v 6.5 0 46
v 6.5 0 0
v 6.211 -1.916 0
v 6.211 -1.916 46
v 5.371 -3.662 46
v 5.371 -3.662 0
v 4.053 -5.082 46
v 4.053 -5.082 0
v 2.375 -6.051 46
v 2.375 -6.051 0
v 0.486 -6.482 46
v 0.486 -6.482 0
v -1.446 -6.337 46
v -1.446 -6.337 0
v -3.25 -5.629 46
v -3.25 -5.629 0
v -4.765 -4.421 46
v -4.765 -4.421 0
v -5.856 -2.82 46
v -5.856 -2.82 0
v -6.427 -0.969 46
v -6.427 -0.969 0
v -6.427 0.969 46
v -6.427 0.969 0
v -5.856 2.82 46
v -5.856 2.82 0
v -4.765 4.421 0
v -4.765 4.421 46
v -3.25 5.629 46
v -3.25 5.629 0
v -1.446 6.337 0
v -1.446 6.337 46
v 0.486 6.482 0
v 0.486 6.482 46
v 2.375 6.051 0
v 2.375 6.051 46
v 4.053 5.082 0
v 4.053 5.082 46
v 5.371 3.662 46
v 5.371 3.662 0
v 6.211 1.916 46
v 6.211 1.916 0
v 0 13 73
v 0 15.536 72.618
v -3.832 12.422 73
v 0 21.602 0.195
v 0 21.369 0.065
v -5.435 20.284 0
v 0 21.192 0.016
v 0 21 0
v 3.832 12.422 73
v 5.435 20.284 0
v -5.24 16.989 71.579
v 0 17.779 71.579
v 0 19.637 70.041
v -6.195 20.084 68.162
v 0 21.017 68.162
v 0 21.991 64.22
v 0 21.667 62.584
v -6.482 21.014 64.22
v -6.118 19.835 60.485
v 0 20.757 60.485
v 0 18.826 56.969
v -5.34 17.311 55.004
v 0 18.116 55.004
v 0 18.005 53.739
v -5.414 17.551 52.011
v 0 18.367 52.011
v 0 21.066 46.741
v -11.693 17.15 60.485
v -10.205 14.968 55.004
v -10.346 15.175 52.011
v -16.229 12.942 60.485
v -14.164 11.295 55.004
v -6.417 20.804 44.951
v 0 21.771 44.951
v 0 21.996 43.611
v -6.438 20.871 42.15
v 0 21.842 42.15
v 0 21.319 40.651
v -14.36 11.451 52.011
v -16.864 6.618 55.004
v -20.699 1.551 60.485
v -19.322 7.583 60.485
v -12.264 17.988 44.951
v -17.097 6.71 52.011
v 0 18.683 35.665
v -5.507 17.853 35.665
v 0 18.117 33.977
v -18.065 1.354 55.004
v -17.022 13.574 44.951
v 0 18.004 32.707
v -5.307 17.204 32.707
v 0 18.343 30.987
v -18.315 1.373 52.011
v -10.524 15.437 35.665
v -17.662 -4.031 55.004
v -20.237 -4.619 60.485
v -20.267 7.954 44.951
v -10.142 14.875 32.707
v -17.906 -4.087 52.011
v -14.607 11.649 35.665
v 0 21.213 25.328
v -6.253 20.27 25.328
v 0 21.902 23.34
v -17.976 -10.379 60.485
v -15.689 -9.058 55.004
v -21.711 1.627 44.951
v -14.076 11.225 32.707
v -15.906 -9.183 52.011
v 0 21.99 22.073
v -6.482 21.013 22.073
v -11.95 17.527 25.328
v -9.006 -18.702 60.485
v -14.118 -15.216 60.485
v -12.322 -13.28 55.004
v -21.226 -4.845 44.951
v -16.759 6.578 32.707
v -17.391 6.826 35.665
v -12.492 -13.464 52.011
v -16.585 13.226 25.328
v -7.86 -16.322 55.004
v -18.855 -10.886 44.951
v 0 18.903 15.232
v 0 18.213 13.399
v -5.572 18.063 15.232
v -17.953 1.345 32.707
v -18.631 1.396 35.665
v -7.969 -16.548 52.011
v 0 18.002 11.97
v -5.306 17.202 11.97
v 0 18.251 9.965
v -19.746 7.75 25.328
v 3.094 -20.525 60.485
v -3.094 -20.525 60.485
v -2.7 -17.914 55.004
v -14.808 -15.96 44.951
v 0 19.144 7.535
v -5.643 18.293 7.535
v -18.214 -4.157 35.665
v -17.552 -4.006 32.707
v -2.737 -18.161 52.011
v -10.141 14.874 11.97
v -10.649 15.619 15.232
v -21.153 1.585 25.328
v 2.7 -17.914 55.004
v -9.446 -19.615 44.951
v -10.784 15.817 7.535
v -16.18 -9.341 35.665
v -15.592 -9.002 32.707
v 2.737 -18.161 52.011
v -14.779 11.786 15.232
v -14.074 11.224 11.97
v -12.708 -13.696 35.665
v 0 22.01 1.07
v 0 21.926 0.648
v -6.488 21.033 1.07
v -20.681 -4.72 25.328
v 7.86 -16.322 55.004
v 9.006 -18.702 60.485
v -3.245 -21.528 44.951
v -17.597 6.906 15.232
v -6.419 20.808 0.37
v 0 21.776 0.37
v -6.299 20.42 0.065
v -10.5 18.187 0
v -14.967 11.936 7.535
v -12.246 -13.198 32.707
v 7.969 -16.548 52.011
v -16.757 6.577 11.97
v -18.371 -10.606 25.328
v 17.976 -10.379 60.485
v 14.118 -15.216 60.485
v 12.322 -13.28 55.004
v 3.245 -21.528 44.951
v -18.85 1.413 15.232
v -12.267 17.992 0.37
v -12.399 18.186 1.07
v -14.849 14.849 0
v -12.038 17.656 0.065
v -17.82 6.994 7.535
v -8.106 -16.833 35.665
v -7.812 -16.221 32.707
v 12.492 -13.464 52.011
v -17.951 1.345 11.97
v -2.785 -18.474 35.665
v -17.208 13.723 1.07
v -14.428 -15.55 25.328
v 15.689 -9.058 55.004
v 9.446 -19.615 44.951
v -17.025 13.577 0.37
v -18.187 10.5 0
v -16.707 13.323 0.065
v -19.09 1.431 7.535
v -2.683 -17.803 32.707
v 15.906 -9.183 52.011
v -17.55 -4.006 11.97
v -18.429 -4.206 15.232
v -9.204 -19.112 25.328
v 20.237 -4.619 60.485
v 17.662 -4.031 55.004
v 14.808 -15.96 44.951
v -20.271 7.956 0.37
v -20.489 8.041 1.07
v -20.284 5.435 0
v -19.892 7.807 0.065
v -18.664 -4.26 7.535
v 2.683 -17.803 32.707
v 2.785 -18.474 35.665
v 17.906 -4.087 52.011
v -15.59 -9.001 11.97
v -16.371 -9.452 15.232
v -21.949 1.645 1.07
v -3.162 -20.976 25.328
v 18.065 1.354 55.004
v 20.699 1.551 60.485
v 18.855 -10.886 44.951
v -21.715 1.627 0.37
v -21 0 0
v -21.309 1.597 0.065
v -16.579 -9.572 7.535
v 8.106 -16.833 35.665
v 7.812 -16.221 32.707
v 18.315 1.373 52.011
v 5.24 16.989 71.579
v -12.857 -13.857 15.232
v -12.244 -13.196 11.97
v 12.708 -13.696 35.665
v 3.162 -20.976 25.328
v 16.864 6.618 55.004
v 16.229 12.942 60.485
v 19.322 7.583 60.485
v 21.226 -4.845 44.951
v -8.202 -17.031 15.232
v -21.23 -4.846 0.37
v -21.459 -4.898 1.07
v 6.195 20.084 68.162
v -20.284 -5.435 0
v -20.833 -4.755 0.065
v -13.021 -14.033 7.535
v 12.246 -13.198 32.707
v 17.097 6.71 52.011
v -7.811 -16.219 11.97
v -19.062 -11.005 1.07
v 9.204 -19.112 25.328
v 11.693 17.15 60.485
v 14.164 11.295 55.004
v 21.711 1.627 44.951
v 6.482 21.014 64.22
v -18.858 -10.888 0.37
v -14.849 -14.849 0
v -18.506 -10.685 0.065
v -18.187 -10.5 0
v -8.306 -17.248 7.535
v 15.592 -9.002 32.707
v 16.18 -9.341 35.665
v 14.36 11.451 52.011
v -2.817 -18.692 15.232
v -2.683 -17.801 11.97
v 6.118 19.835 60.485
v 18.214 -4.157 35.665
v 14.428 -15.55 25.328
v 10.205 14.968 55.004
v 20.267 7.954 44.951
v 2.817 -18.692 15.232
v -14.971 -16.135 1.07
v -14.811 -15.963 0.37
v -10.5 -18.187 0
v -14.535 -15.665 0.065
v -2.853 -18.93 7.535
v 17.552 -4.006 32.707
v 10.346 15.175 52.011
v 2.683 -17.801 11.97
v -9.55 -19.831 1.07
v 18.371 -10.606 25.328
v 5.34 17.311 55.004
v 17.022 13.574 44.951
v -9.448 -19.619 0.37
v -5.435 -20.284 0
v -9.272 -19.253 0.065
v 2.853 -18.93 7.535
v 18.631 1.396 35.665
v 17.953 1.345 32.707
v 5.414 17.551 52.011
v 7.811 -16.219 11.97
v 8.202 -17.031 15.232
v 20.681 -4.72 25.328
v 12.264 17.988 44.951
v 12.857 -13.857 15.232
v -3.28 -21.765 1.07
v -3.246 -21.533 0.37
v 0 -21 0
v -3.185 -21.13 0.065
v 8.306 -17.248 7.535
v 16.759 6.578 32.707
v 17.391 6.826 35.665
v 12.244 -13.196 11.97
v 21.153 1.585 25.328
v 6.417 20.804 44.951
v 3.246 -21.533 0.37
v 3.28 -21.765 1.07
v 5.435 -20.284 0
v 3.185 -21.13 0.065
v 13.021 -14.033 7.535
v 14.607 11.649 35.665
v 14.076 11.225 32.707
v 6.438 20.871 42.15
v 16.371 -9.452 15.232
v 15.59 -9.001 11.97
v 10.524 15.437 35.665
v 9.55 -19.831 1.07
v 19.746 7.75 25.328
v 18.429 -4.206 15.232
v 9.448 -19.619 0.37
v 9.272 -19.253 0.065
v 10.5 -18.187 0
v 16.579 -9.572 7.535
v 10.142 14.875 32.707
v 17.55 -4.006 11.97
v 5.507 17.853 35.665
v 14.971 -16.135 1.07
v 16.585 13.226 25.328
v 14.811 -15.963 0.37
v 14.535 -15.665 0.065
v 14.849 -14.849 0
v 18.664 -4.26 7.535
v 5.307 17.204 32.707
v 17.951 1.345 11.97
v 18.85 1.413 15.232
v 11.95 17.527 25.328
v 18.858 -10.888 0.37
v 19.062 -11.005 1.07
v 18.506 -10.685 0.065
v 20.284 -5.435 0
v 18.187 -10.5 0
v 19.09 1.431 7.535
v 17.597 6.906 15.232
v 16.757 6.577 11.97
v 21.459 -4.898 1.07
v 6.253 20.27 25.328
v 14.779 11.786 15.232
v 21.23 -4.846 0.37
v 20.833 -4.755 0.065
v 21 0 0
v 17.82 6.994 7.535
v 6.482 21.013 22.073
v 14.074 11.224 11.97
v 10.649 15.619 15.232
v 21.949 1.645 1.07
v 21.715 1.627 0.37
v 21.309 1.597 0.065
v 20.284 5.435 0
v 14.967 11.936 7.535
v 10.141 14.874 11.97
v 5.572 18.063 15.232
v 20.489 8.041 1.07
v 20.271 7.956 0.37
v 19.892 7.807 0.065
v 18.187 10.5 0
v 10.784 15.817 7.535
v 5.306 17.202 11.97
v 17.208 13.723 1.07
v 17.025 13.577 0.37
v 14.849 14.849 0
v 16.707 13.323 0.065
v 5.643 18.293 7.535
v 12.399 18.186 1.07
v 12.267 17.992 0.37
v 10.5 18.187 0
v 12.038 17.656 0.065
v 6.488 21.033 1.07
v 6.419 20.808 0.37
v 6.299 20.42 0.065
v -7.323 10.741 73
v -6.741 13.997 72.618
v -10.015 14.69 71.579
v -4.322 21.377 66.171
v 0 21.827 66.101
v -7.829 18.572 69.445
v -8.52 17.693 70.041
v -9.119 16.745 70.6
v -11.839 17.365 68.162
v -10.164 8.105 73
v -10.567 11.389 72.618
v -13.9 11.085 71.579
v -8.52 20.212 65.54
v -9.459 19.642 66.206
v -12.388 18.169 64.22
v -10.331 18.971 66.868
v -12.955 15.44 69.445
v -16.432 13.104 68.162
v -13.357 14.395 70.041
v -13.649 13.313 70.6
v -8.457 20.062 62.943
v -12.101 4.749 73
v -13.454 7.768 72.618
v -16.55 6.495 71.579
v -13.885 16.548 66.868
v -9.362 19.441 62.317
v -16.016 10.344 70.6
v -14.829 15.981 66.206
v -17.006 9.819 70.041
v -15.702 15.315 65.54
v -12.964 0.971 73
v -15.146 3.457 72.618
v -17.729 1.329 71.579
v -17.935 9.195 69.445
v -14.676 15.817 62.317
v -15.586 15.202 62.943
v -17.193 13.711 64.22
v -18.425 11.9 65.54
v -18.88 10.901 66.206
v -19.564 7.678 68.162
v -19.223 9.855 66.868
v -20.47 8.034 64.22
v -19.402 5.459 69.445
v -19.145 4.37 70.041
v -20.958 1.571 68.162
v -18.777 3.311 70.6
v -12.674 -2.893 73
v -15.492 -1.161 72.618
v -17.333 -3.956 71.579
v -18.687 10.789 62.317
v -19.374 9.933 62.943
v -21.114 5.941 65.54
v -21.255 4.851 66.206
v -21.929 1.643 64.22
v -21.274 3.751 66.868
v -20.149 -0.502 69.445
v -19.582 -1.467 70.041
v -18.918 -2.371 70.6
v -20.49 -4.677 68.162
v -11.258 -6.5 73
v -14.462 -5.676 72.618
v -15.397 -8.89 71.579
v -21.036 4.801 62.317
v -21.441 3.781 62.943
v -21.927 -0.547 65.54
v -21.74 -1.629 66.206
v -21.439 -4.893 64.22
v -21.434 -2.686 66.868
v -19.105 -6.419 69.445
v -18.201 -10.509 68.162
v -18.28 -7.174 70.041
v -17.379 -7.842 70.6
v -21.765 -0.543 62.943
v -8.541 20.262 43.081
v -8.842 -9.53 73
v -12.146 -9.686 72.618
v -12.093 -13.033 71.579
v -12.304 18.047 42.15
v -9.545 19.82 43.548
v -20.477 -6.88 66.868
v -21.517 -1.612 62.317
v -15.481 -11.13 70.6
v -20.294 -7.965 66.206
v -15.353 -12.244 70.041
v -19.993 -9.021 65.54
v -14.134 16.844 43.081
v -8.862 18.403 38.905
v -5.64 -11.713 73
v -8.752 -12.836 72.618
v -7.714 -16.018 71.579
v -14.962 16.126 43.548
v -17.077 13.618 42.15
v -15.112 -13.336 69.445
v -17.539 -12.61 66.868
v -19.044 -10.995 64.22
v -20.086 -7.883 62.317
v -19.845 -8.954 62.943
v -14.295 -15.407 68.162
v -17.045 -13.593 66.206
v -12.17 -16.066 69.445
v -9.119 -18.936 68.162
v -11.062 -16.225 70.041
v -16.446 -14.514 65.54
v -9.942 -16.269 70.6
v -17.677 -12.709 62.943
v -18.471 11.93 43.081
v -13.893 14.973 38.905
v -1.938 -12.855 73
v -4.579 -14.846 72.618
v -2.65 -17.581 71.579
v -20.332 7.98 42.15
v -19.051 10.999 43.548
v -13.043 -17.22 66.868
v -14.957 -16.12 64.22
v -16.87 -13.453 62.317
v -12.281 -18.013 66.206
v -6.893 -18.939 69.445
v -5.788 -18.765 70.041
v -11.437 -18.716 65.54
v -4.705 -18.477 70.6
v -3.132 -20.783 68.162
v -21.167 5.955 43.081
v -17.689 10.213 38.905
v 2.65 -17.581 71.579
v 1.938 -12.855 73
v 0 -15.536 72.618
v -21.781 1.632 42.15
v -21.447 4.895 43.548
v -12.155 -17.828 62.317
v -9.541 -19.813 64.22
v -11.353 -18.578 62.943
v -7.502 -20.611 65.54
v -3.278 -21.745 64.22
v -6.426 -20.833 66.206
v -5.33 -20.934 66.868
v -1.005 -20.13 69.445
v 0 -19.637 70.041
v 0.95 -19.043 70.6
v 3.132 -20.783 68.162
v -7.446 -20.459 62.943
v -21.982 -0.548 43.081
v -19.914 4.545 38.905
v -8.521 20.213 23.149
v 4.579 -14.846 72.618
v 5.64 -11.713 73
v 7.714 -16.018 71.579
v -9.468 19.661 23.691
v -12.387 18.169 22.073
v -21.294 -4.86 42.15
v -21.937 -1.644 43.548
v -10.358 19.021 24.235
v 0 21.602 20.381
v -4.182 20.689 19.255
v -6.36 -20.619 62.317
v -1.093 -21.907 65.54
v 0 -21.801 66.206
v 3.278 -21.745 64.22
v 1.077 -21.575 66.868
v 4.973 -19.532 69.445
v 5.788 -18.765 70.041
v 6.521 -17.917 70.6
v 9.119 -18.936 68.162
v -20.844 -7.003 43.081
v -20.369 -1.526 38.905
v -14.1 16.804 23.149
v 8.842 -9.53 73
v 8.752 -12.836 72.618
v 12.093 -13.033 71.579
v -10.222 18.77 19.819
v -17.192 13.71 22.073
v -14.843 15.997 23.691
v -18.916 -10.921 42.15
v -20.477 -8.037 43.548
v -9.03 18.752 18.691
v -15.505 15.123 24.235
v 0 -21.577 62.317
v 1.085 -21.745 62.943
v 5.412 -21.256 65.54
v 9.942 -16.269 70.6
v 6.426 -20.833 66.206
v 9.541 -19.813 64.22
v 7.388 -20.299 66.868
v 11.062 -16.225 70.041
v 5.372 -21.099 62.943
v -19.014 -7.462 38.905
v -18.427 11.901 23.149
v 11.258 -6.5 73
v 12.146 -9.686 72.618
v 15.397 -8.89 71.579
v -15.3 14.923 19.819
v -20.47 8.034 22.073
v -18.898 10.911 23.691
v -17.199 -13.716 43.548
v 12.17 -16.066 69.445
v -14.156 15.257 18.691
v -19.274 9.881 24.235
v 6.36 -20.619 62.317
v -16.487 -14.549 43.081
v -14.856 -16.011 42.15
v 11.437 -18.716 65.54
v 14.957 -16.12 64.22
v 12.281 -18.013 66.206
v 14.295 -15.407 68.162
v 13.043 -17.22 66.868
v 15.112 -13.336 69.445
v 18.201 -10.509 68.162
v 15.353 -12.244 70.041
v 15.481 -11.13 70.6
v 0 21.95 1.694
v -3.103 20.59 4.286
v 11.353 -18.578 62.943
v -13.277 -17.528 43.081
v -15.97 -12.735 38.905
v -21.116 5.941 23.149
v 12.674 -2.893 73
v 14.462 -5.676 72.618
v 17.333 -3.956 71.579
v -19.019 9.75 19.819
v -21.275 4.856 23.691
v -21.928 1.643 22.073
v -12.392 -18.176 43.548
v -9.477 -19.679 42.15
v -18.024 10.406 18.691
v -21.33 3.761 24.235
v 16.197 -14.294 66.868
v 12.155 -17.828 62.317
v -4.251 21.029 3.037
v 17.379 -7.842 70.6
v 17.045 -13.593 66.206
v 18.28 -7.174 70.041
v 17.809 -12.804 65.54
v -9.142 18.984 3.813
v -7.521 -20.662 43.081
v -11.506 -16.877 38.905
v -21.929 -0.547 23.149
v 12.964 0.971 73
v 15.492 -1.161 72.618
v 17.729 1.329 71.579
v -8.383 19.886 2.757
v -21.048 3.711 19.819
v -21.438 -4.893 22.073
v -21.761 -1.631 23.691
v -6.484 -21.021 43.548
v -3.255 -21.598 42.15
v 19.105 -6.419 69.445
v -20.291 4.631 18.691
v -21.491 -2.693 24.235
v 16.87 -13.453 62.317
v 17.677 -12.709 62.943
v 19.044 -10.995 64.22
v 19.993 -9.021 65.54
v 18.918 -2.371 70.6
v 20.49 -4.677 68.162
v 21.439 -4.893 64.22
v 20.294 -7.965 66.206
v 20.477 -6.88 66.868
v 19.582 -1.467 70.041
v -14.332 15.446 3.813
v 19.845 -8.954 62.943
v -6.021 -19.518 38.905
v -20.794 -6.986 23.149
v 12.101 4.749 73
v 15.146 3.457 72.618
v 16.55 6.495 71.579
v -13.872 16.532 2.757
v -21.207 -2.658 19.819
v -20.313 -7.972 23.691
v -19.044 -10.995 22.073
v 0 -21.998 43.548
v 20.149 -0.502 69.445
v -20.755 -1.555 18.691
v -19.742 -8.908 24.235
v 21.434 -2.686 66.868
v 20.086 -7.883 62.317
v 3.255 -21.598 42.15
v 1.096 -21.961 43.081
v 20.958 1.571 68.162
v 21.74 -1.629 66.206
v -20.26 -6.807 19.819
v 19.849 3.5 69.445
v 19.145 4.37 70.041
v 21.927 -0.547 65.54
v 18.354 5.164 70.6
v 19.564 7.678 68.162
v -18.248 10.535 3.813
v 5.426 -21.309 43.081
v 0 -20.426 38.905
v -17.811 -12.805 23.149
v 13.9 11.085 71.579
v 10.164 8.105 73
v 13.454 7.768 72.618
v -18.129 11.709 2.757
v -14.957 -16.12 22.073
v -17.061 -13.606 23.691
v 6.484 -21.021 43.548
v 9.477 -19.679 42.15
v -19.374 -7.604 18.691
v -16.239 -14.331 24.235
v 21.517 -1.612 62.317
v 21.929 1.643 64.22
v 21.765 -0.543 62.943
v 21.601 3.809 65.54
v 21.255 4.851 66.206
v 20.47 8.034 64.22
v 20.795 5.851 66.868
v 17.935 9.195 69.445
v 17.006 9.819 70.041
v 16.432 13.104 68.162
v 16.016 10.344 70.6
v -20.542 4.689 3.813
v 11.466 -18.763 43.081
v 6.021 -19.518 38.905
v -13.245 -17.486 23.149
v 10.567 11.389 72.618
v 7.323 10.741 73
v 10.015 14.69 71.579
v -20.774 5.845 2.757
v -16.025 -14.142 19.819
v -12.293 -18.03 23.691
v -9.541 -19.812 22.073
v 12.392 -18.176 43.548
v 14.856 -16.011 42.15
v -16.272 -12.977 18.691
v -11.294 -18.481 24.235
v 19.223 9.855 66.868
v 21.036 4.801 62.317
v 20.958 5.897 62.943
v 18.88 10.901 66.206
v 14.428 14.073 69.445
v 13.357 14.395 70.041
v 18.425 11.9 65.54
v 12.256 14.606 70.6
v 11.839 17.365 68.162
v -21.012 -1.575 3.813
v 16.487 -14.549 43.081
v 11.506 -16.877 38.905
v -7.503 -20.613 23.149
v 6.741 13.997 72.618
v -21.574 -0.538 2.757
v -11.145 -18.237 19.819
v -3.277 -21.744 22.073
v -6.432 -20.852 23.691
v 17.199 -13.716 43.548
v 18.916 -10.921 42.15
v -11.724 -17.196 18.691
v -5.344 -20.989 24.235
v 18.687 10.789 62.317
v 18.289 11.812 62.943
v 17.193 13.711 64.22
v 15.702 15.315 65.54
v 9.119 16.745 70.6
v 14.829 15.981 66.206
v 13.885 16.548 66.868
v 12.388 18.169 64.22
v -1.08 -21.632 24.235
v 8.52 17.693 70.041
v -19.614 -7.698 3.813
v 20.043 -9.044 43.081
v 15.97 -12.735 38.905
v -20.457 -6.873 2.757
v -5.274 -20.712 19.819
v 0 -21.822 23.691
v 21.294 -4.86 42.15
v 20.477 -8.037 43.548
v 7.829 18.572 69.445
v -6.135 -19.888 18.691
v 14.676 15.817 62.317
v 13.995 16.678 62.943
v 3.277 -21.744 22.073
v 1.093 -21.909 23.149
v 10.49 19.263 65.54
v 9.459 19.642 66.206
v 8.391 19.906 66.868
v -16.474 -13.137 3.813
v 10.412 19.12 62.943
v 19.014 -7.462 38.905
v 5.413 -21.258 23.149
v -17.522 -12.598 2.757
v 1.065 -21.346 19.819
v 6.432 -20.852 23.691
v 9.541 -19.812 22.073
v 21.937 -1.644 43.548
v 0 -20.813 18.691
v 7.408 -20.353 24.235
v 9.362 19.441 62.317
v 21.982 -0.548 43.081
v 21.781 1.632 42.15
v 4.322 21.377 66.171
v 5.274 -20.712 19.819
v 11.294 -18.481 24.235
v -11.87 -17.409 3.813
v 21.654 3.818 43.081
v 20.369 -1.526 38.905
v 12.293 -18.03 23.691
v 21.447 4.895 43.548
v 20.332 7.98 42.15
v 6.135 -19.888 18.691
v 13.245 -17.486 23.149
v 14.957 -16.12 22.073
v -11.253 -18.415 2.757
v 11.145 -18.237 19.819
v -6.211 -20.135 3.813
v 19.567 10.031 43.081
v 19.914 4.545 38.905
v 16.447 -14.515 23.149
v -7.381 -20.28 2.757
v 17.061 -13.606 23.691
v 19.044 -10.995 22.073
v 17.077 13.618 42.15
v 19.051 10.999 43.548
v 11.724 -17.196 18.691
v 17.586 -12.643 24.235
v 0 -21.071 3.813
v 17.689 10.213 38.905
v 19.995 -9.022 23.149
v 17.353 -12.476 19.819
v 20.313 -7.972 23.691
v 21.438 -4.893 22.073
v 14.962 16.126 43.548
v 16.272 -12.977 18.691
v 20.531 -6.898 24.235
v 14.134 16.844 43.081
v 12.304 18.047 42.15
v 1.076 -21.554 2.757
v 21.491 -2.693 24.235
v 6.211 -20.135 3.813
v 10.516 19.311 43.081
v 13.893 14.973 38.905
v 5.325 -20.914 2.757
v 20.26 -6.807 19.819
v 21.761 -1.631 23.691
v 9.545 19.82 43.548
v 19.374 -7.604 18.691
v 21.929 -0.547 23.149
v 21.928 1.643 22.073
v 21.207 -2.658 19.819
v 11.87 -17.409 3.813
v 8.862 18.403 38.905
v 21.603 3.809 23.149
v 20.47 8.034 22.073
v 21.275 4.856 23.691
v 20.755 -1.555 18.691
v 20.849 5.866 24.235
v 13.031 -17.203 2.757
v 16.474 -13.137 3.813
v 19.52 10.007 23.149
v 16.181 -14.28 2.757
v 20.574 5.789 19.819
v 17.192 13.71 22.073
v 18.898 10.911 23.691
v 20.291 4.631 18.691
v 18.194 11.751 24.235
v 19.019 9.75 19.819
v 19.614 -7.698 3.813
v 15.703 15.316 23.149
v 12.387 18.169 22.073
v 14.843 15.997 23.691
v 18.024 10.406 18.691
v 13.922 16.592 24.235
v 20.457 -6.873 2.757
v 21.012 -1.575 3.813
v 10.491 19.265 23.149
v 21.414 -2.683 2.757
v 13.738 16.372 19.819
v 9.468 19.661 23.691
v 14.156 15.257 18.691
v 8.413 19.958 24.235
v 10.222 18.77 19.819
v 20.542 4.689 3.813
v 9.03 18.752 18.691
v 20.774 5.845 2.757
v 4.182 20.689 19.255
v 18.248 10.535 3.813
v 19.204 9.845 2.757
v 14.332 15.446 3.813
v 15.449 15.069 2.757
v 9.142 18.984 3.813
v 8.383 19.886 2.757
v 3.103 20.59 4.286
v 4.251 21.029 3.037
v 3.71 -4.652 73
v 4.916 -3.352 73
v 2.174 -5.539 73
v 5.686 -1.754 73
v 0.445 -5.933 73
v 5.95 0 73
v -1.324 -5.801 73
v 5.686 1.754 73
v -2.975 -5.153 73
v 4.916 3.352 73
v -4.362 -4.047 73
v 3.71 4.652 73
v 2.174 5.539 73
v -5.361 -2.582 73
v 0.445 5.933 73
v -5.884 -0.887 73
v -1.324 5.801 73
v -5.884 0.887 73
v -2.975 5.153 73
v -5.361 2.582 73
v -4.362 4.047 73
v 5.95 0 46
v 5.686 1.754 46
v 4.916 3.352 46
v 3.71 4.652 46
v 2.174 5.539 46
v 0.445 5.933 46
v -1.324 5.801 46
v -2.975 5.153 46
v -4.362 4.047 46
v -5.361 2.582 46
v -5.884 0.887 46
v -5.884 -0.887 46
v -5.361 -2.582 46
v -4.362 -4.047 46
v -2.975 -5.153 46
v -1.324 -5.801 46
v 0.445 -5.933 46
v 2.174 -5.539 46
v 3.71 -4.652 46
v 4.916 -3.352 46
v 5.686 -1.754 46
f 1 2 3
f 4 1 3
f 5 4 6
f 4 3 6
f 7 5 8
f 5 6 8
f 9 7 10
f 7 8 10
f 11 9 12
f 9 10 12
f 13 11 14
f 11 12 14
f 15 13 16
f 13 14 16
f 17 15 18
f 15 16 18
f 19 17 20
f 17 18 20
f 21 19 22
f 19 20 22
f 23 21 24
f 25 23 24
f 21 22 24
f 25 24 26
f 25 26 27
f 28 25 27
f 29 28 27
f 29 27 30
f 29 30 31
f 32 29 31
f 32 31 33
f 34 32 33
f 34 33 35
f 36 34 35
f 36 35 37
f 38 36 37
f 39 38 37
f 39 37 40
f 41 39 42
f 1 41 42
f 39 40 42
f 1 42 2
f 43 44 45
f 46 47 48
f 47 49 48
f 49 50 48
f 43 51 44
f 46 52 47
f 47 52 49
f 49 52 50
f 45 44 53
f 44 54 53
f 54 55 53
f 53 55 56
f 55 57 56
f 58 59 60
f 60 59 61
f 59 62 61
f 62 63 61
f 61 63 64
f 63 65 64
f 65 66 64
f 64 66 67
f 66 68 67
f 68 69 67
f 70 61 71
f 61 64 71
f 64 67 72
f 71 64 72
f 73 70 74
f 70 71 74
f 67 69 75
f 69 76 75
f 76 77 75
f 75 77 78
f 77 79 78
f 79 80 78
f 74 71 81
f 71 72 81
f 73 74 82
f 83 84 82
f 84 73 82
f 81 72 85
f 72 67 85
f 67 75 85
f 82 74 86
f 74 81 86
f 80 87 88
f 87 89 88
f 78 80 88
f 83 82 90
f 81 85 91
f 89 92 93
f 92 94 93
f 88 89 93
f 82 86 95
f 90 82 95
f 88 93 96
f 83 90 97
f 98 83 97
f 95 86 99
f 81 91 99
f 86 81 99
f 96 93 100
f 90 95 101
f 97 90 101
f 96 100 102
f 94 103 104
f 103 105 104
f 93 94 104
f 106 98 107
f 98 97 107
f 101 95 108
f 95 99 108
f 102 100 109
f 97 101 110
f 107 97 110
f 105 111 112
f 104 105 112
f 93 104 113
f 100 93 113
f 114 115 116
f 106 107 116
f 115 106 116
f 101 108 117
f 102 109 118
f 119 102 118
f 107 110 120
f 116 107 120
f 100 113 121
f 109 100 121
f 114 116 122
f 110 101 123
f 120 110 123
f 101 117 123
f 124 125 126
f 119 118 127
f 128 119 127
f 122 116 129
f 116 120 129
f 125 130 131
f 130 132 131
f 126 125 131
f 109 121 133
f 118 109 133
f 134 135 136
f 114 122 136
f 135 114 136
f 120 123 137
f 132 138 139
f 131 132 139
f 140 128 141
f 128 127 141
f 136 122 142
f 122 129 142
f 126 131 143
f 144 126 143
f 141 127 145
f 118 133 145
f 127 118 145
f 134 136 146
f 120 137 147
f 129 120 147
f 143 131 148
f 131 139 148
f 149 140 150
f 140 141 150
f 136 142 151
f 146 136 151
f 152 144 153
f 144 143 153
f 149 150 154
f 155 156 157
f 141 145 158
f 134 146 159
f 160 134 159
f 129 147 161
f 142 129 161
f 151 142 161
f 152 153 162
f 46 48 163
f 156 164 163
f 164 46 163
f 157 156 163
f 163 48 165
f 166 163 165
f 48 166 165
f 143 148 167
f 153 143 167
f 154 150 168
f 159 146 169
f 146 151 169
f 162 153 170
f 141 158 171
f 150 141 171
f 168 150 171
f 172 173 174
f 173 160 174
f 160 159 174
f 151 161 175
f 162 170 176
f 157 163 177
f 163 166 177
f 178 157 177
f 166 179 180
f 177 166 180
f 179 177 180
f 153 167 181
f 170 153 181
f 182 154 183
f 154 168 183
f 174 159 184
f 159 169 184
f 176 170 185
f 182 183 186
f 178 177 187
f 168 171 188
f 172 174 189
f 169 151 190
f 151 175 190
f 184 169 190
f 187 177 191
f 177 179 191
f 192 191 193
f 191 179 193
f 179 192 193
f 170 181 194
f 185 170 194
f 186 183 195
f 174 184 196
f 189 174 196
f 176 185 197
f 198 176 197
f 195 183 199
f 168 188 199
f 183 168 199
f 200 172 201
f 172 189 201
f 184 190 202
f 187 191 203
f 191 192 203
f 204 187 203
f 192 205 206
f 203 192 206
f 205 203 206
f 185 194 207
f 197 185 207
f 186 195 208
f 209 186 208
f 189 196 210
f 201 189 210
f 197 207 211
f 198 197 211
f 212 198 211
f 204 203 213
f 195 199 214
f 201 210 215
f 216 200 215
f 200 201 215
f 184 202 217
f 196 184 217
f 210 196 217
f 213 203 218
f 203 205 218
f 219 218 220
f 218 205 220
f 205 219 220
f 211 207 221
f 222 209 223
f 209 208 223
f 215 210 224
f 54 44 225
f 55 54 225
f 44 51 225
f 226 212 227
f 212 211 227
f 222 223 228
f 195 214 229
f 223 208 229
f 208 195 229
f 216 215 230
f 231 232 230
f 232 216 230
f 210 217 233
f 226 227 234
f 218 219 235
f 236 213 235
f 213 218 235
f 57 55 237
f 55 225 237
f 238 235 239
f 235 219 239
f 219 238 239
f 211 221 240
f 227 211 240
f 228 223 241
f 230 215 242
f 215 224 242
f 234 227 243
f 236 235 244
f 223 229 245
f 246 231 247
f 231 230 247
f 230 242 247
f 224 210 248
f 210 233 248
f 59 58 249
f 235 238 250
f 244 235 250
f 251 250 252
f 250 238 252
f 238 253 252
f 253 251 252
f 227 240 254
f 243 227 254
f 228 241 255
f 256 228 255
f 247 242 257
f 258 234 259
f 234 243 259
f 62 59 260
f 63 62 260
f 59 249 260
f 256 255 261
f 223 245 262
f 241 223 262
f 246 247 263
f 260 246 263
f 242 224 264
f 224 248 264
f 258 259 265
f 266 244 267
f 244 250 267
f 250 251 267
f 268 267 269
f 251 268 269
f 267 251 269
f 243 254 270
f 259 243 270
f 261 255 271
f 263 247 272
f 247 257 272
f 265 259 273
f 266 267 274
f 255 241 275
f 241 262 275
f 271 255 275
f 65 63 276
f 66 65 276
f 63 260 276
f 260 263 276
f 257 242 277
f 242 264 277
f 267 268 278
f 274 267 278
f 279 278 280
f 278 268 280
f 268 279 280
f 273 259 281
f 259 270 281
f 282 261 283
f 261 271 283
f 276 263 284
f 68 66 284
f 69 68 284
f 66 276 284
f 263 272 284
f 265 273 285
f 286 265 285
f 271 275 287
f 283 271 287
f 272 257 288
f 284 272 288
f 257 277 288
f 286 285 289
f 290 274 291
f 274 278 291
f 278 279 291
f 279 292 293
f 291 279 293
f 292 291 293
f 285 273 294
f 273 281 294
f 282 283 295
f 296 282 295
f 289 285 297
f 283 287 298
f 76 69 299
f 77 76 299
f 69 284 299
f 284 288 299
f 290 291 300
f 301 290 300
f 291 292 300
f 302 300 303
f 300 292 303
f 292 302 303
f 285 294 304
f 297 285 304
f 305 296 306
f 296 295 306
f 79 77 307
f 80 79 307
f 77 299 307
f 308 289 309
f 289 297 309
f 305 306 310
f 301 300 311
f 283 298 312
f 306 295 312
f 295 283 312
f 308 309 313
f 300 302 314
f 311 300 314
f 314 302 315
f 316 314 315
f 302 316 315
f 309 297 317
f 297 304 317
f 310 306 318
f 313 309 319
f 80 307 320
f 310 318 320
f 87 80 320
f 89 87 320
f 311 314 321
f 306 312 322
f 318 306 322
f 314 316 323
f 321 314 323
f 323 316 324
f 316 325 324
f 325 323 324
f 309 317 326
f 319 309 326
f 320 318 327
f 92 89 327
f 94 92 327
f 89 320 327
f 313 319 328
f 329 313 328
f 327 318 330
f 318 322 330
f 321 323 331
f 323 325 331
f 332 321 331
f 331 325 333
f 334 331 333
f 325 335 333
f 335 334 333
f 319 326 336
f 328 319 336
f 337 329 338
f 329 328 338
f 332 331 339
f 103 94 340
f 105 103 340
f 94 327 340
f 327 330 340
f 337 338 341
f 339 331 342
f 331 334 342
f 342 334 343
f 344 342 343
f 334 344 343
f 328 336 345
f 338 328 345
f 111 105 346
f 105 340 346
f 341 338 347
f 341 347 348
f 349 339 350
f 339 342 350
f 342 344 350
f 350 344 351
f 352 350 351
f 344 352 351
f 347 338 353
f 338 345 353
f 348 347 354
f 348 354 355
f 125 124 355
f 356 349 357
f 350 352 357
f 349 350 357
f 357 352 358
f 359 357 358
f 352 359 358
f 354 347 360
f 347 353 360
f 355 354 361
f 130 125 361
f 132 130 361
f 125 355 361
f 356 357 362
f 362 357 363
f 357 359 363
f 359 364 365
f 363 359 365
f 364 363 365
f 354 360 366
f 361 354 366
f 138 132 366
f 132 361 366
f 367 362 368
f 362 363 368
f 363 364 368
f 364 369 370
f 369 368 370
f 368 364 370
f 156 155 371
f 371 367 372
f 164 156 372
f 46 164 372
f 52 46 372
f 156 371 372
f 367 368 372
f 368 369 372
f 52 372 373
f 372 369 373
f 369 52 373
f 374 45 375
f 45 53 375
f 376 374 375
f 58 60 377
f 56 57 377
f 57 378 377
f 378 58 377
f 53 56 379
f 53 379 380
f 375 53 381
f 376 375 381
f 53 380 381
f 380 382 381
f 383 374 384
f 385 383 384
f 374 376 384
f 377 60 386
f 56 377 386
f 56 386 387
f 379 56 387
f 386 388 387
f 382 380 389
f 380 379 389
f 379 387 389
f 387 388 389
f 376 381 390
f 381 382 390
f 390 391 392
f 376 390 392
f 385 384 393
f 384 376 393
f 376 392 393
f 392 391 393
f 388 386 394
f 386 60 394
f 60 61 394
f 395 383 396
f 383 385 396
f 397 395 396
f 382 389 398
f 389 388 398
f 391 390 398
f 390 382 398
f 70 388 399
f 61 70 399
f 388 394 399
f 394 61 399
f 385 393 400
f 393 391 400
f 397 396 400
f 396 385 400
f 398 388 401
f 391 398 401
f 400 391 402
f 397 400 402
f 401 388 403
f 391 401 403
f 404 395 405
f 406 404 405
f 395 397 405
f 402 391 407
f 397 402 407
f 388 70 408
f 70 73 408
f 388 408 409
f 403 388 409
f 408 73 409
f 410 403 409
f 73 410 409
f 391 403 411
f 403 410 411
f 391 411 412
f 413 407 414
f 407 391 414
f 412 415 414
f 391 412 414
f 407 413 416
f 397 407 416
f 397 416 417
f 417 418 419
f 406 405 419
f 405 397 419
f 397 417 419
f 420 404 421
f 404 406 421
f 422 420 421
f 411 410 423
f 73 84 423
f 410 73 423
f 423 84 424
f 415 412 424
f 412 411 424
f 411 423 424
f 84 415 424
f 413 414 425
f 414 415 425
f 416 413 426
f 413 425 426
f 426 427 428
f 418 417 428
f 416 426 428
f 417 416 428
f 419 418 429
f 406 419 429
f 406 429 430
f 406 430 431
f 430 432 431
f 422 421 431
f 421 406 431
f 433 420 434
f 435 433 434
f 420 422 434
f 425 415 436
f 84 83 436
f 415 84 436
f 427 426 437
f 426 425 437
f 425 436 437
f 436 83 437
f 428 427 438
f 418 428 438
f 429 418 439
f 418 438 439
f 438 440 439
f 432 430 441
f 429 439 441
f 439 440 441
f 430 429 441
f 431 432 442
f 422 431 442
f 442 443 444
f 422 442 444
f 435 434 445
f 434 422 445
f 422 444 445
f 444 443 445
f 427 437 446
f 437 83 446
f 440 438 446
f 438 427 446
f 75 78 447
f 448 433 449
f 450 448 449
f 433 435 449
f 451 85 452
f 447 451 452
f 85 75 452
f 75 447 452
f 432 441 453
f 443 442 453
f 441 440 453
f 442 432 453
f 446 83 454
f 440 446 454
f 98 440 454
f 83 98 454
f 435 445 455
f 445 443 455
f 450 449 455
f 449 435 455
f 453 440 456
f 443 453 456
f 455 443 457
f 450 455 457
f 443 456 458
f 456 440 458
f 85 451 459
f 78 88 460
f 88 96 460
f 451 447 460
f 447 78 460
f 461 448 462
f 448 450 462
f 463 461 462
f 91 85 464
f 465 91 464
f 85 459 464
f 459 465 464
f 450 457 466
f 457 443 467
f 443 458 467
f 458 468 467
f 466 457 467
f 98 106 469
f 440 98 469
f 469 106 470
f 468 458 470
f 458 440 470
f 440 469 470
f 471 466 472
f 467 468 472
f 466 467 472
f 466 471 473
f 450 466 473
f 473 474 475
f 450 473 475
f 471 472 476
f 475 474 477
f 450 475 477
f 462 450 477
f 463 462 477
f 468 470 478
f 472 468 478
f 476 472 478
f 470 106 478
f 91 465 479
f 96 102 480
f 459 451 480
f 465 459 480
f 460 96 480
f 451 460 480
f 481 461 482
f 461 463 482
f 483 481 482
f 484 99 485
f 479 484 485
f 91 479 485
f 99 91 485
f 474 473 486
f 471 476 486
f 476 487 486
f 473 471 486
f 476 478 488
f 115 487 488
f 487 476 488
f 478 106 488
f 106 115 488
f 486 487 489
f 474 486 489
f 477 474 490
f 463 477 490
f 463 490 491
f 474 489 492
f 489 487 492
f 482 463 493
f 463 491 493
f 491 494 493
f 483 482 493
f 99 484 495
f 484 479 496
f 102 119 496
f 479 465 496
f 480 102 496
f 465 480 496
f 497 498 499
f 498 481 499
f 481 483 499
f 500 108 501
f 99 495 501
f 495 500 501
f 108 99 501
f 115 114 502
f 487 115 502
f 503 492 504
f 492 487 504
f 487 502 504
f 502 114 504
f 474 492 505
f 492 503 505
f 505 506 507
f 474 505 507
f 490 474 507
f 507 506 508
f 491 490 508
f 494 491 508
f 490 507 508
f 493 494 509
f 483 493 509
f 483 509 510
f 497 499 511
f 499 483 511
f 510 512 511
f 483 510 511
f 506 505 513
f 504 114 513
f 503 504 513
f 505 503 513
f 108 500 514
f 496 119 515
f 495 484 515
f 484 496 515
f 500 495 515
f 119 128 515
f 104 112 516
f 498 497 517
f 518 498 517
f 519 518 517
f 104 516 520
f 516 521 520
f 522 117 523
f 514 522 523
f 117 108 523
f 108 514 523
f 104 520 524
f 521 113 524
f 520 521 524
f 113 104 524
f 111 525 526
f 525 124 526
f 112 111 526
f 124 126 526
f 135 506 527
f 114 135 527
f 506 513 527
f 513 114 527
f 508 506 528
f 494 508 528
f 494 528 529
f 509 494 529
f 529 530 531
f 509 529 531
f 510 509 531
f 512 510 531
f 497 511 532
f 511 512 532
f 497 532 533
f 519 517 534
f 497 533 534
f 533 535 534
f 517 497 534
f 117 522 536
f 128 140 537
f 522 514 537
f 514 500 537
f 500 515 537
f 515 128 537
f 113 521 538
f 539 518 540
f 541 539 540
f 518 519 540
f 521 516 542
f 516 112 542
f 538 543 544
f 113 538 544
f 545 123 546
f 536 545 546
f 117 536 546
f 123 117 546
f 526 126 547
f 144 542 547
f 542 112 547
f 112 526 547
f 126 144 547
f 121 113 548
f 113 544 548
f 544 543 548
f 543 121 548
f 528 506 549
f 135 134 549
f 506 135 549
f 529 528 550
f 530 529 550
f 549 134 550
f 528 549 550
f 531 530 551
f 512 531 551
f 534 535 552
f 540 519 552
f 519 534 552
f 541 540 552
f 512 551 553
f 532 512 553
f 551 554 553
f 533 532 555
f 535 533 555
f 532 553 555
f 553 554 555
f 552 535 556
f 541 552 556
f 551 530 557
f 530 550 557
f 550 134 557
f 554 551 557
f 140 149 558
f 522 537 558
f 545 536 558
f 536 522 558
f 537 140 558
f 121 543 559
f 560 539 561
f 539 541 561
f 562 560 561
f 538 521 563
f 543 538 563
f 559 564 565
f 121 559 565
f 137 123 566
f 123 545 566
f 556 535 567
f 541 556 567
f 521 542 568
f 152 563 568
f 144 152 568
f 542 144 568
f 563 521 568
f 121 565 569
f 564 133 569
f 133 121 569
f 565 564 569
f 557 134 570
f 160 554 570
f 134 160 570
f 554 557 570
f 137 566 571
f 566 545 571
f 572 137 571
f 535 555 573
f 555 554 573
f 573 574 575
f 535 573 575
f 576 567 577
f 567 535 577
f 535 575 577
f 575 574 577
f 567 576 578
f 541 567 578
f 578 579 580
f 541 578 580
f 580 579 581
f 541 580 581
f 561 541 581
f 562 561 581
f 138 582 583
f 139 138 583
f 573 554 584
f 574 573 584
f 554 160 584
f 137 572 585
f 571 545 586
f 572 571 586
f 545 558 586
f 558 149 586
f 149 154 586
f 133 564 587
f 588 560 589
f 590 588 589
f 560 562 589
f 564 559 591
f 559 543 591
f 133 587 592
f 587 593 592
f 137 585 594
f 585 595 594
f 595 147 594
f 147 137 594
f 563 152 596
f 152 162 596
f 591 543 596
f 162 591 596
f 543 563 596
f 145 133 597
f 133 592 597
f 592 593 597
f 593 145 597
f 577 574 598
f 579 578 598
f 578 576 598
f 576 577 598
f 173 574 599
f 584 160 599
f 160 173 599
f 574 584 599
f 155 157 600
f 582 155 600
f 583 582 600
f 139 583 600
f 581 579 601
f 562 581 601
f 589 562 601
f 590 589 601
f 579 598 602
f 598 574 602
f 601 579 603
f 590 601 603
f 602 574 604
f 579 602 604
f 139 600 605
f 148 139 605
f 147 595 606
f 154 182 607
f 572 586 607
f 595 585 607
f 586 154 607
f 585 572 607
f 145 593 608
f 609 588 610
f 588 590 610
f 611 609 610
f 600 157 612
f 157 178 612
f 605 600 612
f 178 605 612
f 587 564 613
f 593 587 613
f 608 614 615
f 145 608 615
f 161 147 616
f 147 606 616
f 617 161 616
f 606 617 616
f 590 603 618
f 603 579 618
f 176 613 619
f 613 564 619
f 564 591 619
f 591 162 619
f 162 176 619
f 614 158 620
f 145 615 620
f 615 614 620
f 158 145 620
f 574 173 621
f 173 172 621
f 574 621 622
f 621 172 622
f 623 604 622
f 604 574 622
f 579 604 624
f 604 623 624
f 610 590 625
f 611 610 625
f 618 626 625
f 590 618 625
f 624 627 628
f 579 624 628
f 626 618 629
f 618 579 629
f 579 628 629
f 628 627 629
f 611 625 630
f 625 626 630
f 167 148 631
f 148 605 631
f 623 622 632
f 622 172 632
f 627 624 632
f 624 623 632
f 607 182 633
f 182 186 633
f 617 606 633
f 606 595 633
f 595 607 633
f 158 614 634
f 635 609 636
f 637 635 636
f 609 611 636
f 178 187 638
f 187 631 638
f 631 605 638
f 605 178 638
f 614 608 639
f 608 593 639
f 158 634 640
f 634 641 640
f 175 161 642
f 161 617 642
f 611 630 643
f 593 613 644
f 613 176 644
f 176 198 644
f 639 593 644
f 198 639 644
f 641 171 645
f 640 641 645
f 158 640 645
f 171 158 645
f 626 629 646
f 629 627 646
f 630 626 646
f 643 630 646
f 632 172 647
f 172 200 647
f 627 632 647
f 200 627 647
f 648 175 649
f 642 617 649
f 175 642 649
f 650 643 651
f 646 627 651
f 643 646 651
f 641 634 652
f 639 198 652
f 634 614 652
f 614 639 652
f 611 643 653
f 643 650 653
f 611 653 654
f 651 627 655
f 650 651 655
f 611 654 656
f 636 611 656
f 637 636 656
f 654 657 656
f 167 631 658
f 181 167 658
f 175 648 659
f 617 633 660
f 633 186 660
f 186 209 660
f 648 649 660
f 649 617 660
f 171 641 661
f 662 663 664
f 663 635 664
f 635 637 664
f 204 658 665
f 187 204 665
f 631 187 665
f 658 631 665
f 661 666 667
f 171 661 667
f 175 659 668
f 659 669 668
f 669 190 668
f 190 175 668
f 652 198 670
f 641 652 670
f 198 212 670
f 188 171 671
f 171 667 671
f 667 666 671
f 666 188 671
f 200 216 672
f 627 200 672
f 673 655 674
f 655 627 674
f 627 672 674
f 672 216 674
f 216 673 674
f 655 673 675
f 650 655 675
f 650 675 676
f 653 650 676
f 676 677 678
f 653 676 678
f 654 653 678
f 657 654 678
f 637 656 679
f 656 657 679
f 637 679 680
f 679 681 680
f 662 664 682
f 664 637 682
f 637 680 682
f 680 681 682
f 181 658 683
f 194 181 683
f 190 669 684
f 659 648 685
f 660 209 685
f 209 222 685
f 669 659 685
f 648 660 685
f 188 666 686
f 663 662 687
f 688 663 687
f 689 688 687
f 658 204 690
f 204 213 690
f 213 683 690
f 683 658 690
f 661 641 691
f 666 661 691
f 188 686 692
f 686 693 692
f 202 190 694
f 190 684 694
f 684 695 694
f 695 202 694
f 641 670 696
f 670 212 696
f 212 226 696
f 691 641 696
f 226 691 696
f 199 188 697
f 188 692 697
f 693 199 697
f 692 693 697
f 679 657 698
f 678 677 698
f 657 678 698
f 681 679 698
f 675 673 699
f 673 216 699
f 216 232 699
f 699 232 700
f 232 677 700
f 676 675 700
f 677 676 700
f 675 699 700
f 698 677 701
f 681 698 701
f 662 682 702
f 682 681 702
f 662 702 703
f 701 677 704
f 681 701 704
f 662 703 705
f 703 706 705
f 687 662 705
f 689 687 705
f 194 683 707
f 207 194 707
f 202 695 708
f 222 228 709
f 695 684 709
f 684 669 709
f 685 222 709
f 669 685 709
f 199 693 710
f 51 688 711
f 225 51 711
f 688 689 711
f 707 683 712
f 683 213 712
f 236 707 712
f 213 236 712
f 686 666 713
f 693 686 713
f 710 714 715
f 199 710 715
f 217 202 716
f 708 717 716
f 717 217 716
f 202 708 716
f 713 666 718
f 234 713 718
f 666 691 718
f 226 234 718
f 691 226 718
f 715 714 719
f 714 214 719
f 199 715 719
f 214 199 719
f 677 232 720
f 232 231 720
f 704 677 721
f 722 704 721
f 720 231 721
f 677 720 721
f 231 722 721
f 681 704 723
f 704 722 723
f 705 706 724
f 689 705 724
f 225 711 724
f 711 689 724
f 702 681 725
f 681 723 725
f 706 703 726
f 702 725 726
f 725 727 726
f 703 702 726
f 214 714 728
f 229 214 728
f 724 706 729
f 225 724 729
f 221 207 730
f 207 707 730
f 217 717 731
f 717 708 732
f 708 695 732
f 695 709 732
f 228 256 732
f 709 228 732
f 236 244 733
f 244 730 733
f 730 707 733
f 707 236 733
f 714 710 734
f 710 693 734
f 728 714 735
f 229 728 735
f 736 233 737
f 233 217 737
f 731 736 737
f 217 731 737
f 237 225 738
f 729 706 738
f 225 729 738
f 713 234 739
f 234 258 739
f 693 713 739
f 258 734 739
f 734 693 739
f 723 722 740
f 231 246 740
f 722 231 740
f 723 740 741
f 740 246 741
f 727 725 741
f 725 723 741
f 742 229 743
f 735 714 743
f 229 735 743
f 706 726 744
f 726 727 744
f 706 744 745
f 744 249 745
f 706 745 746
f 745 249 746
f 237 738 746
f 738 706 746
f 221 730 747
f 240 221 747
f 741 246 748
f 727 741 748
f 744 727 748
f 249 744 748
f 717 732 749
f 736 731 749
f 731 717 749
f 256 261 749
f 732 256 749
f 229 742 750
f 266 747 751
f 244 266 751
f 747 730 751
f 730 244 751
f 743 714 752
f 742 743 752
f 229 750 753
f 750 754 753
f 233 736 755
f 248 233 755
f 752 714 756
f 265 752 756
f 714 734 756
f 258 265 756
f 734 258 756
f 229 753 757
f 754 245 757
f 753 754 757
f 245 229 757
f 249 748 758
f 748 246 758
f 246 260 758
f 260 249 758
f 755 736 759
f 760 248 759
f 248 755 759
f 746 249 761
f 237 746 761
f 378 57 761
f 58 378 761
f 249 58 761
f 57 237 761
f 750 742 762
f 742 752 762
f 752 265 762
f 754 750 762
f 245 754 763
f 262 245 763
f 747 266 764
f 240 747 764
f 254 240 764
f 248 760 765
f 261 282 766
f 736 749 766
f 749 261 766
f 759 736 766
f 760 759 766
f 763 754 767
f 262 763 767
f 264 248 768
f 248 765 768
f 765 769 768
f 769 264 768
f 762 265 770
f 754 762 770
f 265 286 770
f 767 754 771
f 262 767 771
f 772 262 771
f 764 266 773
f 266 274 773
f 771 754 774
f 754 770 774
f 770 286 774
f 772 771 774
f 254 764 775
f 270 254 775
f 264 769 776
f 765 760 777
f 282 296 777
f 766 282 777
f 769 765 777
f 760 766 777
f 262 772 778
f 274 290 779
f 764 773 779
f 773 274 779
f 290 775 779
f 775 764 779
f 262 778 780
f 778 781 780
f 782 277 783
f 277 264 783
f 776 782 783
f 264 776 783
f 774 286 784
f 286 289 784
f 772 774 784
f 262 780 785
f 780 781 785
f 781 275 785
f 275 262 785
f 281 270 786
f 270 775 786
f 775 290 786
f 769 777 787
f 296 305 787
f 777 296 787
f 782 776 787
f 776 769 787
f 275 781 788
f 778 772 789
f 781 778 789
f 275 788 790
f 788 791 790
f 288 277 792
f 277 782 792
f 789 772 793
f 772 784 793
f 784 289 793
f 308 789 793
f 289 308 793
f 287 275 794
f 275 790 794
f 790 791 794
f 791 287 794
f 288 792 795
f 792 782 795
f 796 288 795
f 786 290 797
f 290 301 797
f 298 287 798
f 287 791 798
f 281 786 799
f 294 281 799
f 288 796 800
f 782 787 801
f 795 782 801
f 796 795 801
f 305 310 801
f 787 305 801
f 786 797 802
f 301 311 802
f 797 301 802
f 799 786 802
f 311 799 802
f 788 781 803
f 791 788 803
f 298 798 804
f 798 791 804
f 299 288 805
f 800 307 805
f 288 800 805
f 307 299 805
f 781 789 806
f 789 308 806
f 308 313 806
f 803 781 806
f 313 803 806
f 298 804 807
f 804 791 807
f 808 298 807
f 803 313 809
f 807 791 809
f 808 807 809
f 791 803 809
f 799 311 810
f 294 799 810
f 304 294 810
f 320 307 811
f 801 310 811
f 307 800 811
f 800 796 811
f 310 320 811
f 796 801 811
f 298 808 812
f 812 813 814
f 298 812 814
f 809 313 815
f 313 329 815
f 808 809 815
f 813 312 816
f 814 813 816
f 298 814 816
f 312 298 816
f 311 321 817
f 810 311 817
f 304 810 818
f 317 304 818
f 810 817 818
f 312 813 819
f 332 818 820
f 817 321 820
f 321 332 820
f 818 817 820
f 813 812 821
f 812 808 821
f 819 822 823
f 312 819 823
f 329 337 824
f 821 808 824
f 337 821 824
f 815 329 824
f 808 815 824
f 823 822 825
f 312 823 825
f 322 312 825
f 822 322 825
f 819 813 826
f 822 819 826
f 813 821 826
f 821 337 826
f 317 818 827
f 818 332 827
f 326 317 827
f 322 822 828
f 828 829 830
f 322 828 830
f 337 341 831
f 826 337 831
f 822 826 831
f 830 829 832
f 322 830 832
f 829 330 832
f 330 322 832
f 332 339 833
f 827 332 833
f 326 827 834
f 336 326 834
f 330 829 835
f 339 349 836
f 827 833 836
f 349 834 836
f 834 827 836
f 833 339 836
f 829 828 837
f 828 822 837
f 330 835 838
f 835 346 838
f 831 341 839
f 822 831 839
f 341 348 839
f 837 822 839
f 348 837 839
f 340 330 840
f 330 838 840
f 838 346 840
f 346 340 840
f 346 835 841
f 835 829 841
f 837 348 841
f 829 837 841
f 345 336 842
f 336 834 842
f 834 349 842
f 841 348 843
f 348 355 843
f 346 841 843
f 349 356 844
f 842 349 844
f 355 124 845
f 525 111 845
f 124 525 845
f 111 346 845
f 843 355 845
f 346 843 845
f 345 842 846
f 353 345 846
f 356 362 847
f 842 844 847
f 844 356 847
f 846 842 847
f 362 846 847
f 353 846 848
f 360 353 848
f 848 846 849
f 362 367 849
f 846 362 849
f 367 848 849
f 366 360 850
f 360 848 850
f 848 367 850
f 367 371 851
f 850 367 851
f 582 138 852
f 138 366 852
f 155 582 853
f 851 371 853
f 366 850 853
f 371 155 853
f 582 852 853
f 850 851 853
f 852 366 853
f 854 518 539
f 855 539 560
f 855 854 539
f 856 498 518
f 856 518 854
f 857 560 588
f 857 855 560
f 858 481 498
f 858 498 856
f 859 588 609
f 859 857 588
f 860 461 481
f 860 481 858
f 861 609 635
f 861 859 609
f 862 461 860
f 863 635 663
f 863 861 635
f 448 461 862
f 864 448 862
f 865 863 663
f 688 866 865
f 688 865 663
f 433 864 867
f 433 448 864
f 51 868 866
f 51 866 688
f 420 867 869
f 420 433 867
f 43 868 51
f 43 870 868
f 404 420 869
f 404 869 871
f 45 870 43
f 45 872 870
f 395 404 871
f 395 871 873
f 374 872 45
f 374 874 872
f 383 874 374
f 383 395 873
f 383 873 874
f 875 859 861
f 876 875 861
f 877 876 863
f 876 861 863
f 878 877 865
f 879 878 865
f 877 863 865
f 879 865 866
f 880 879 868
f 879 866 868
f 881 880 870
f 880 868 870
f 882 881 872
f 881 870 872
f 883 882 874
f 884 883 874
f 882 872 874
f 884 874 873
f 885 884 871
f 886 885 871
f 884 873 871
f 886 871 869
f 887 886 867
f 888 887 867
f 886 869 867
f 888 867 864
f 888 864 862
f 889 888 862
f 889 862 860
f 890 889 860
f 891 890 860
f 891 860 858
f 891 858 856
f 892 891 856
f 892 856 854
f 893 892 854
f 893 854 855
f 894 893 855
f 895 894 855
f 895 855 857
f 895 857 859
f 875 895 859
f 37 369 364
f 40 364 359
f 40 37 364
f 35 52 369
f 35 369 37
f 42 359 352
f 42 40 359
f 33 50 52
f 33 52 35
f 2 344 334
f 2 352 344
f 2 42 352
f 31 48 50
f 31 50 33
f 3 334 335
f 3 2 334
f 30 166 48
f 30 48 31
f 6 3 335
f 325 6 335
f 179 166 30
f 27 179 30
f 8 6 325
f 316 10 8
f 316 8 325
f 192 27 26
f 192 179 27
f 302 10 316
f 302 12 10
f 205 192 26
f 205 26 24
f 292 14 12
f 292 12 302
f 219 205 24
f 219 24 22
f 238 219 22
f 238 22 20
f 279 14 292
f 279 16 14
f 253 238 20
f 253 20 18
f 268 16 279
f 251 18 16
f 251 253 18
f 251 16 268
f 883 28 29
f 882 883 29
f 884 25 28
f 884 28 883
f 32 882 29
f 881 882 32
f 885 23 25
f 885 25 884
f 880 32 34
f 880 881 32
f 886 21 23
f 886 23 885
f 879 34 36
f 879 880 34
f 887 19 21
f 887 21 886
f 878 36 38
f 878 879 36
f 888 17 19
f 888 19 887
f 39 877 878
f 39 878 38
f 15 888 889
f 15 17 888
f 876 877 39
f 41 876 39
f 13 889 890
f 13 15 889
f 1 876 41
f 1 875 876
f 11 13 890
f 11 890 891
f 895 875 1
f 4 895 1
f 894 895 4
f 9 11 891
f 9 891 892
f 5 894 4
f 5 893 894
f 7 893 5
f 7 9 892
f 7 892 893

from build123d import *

# Parameters (mm, degrees)
F2_R     = 5.95
F3_DEPTH = 73.0010001
F4_R     = 6.5
F5_DEPTH = 46


with BuildPart() as f1:
    # F0 (on Right) → F1 (revolve)
    with BuildSketch(Plane.YZ):
        with BuildLine():
            Line((0, 73), (0, 0))
            Line((0, 0), (21, 0))
            add(Edge.make_bspline(
                [(13, 73), (18.136955159, 73), (25.9599337866, 64.0409360544), (14.06615934, 54.0451662341), (25.9802216397, 43.3505110298), (14.0129541012, 32.9527896469), (25.9679619557, 22.2383303828), (14.1151980762, 12.4938888218), (23.2468316742, 1.8862408584), (21.646819451, 0), (21, 0)],
                knots=[0, 0, 0, 0, 0.1413997222, 0.2757385334, 0.4100773447, 0.544416156, 0.6787549672, 0.8130937785, 0.9474325897, 1, 1, 1, 1], degree=3))
            Line((13, 73), (0, 73))
        make_face()
    revolve(axis=Axis((0, 0, 36.5), (0, 0, 1)))

    # F2 (on face) → F3 (cut, through all)
    with BuildSketch(Plane.XY.offset(73)):
        Circle(F2_R)
    extrude(amount=-F3_DEPTH, mode=Mode.SUBTRACT)

    # F4 (on face) → F5 (cut)
    with BuildSketch(Plane(origin=(0, 0, 0), x_dir=(1, 0, 0), z_dir=(0, 0, -1))):
        Circle(F4_R)
    extrude(amount=-F5_DEPTH, mode=Mode.SUBTRACT)


solid = f1.part
